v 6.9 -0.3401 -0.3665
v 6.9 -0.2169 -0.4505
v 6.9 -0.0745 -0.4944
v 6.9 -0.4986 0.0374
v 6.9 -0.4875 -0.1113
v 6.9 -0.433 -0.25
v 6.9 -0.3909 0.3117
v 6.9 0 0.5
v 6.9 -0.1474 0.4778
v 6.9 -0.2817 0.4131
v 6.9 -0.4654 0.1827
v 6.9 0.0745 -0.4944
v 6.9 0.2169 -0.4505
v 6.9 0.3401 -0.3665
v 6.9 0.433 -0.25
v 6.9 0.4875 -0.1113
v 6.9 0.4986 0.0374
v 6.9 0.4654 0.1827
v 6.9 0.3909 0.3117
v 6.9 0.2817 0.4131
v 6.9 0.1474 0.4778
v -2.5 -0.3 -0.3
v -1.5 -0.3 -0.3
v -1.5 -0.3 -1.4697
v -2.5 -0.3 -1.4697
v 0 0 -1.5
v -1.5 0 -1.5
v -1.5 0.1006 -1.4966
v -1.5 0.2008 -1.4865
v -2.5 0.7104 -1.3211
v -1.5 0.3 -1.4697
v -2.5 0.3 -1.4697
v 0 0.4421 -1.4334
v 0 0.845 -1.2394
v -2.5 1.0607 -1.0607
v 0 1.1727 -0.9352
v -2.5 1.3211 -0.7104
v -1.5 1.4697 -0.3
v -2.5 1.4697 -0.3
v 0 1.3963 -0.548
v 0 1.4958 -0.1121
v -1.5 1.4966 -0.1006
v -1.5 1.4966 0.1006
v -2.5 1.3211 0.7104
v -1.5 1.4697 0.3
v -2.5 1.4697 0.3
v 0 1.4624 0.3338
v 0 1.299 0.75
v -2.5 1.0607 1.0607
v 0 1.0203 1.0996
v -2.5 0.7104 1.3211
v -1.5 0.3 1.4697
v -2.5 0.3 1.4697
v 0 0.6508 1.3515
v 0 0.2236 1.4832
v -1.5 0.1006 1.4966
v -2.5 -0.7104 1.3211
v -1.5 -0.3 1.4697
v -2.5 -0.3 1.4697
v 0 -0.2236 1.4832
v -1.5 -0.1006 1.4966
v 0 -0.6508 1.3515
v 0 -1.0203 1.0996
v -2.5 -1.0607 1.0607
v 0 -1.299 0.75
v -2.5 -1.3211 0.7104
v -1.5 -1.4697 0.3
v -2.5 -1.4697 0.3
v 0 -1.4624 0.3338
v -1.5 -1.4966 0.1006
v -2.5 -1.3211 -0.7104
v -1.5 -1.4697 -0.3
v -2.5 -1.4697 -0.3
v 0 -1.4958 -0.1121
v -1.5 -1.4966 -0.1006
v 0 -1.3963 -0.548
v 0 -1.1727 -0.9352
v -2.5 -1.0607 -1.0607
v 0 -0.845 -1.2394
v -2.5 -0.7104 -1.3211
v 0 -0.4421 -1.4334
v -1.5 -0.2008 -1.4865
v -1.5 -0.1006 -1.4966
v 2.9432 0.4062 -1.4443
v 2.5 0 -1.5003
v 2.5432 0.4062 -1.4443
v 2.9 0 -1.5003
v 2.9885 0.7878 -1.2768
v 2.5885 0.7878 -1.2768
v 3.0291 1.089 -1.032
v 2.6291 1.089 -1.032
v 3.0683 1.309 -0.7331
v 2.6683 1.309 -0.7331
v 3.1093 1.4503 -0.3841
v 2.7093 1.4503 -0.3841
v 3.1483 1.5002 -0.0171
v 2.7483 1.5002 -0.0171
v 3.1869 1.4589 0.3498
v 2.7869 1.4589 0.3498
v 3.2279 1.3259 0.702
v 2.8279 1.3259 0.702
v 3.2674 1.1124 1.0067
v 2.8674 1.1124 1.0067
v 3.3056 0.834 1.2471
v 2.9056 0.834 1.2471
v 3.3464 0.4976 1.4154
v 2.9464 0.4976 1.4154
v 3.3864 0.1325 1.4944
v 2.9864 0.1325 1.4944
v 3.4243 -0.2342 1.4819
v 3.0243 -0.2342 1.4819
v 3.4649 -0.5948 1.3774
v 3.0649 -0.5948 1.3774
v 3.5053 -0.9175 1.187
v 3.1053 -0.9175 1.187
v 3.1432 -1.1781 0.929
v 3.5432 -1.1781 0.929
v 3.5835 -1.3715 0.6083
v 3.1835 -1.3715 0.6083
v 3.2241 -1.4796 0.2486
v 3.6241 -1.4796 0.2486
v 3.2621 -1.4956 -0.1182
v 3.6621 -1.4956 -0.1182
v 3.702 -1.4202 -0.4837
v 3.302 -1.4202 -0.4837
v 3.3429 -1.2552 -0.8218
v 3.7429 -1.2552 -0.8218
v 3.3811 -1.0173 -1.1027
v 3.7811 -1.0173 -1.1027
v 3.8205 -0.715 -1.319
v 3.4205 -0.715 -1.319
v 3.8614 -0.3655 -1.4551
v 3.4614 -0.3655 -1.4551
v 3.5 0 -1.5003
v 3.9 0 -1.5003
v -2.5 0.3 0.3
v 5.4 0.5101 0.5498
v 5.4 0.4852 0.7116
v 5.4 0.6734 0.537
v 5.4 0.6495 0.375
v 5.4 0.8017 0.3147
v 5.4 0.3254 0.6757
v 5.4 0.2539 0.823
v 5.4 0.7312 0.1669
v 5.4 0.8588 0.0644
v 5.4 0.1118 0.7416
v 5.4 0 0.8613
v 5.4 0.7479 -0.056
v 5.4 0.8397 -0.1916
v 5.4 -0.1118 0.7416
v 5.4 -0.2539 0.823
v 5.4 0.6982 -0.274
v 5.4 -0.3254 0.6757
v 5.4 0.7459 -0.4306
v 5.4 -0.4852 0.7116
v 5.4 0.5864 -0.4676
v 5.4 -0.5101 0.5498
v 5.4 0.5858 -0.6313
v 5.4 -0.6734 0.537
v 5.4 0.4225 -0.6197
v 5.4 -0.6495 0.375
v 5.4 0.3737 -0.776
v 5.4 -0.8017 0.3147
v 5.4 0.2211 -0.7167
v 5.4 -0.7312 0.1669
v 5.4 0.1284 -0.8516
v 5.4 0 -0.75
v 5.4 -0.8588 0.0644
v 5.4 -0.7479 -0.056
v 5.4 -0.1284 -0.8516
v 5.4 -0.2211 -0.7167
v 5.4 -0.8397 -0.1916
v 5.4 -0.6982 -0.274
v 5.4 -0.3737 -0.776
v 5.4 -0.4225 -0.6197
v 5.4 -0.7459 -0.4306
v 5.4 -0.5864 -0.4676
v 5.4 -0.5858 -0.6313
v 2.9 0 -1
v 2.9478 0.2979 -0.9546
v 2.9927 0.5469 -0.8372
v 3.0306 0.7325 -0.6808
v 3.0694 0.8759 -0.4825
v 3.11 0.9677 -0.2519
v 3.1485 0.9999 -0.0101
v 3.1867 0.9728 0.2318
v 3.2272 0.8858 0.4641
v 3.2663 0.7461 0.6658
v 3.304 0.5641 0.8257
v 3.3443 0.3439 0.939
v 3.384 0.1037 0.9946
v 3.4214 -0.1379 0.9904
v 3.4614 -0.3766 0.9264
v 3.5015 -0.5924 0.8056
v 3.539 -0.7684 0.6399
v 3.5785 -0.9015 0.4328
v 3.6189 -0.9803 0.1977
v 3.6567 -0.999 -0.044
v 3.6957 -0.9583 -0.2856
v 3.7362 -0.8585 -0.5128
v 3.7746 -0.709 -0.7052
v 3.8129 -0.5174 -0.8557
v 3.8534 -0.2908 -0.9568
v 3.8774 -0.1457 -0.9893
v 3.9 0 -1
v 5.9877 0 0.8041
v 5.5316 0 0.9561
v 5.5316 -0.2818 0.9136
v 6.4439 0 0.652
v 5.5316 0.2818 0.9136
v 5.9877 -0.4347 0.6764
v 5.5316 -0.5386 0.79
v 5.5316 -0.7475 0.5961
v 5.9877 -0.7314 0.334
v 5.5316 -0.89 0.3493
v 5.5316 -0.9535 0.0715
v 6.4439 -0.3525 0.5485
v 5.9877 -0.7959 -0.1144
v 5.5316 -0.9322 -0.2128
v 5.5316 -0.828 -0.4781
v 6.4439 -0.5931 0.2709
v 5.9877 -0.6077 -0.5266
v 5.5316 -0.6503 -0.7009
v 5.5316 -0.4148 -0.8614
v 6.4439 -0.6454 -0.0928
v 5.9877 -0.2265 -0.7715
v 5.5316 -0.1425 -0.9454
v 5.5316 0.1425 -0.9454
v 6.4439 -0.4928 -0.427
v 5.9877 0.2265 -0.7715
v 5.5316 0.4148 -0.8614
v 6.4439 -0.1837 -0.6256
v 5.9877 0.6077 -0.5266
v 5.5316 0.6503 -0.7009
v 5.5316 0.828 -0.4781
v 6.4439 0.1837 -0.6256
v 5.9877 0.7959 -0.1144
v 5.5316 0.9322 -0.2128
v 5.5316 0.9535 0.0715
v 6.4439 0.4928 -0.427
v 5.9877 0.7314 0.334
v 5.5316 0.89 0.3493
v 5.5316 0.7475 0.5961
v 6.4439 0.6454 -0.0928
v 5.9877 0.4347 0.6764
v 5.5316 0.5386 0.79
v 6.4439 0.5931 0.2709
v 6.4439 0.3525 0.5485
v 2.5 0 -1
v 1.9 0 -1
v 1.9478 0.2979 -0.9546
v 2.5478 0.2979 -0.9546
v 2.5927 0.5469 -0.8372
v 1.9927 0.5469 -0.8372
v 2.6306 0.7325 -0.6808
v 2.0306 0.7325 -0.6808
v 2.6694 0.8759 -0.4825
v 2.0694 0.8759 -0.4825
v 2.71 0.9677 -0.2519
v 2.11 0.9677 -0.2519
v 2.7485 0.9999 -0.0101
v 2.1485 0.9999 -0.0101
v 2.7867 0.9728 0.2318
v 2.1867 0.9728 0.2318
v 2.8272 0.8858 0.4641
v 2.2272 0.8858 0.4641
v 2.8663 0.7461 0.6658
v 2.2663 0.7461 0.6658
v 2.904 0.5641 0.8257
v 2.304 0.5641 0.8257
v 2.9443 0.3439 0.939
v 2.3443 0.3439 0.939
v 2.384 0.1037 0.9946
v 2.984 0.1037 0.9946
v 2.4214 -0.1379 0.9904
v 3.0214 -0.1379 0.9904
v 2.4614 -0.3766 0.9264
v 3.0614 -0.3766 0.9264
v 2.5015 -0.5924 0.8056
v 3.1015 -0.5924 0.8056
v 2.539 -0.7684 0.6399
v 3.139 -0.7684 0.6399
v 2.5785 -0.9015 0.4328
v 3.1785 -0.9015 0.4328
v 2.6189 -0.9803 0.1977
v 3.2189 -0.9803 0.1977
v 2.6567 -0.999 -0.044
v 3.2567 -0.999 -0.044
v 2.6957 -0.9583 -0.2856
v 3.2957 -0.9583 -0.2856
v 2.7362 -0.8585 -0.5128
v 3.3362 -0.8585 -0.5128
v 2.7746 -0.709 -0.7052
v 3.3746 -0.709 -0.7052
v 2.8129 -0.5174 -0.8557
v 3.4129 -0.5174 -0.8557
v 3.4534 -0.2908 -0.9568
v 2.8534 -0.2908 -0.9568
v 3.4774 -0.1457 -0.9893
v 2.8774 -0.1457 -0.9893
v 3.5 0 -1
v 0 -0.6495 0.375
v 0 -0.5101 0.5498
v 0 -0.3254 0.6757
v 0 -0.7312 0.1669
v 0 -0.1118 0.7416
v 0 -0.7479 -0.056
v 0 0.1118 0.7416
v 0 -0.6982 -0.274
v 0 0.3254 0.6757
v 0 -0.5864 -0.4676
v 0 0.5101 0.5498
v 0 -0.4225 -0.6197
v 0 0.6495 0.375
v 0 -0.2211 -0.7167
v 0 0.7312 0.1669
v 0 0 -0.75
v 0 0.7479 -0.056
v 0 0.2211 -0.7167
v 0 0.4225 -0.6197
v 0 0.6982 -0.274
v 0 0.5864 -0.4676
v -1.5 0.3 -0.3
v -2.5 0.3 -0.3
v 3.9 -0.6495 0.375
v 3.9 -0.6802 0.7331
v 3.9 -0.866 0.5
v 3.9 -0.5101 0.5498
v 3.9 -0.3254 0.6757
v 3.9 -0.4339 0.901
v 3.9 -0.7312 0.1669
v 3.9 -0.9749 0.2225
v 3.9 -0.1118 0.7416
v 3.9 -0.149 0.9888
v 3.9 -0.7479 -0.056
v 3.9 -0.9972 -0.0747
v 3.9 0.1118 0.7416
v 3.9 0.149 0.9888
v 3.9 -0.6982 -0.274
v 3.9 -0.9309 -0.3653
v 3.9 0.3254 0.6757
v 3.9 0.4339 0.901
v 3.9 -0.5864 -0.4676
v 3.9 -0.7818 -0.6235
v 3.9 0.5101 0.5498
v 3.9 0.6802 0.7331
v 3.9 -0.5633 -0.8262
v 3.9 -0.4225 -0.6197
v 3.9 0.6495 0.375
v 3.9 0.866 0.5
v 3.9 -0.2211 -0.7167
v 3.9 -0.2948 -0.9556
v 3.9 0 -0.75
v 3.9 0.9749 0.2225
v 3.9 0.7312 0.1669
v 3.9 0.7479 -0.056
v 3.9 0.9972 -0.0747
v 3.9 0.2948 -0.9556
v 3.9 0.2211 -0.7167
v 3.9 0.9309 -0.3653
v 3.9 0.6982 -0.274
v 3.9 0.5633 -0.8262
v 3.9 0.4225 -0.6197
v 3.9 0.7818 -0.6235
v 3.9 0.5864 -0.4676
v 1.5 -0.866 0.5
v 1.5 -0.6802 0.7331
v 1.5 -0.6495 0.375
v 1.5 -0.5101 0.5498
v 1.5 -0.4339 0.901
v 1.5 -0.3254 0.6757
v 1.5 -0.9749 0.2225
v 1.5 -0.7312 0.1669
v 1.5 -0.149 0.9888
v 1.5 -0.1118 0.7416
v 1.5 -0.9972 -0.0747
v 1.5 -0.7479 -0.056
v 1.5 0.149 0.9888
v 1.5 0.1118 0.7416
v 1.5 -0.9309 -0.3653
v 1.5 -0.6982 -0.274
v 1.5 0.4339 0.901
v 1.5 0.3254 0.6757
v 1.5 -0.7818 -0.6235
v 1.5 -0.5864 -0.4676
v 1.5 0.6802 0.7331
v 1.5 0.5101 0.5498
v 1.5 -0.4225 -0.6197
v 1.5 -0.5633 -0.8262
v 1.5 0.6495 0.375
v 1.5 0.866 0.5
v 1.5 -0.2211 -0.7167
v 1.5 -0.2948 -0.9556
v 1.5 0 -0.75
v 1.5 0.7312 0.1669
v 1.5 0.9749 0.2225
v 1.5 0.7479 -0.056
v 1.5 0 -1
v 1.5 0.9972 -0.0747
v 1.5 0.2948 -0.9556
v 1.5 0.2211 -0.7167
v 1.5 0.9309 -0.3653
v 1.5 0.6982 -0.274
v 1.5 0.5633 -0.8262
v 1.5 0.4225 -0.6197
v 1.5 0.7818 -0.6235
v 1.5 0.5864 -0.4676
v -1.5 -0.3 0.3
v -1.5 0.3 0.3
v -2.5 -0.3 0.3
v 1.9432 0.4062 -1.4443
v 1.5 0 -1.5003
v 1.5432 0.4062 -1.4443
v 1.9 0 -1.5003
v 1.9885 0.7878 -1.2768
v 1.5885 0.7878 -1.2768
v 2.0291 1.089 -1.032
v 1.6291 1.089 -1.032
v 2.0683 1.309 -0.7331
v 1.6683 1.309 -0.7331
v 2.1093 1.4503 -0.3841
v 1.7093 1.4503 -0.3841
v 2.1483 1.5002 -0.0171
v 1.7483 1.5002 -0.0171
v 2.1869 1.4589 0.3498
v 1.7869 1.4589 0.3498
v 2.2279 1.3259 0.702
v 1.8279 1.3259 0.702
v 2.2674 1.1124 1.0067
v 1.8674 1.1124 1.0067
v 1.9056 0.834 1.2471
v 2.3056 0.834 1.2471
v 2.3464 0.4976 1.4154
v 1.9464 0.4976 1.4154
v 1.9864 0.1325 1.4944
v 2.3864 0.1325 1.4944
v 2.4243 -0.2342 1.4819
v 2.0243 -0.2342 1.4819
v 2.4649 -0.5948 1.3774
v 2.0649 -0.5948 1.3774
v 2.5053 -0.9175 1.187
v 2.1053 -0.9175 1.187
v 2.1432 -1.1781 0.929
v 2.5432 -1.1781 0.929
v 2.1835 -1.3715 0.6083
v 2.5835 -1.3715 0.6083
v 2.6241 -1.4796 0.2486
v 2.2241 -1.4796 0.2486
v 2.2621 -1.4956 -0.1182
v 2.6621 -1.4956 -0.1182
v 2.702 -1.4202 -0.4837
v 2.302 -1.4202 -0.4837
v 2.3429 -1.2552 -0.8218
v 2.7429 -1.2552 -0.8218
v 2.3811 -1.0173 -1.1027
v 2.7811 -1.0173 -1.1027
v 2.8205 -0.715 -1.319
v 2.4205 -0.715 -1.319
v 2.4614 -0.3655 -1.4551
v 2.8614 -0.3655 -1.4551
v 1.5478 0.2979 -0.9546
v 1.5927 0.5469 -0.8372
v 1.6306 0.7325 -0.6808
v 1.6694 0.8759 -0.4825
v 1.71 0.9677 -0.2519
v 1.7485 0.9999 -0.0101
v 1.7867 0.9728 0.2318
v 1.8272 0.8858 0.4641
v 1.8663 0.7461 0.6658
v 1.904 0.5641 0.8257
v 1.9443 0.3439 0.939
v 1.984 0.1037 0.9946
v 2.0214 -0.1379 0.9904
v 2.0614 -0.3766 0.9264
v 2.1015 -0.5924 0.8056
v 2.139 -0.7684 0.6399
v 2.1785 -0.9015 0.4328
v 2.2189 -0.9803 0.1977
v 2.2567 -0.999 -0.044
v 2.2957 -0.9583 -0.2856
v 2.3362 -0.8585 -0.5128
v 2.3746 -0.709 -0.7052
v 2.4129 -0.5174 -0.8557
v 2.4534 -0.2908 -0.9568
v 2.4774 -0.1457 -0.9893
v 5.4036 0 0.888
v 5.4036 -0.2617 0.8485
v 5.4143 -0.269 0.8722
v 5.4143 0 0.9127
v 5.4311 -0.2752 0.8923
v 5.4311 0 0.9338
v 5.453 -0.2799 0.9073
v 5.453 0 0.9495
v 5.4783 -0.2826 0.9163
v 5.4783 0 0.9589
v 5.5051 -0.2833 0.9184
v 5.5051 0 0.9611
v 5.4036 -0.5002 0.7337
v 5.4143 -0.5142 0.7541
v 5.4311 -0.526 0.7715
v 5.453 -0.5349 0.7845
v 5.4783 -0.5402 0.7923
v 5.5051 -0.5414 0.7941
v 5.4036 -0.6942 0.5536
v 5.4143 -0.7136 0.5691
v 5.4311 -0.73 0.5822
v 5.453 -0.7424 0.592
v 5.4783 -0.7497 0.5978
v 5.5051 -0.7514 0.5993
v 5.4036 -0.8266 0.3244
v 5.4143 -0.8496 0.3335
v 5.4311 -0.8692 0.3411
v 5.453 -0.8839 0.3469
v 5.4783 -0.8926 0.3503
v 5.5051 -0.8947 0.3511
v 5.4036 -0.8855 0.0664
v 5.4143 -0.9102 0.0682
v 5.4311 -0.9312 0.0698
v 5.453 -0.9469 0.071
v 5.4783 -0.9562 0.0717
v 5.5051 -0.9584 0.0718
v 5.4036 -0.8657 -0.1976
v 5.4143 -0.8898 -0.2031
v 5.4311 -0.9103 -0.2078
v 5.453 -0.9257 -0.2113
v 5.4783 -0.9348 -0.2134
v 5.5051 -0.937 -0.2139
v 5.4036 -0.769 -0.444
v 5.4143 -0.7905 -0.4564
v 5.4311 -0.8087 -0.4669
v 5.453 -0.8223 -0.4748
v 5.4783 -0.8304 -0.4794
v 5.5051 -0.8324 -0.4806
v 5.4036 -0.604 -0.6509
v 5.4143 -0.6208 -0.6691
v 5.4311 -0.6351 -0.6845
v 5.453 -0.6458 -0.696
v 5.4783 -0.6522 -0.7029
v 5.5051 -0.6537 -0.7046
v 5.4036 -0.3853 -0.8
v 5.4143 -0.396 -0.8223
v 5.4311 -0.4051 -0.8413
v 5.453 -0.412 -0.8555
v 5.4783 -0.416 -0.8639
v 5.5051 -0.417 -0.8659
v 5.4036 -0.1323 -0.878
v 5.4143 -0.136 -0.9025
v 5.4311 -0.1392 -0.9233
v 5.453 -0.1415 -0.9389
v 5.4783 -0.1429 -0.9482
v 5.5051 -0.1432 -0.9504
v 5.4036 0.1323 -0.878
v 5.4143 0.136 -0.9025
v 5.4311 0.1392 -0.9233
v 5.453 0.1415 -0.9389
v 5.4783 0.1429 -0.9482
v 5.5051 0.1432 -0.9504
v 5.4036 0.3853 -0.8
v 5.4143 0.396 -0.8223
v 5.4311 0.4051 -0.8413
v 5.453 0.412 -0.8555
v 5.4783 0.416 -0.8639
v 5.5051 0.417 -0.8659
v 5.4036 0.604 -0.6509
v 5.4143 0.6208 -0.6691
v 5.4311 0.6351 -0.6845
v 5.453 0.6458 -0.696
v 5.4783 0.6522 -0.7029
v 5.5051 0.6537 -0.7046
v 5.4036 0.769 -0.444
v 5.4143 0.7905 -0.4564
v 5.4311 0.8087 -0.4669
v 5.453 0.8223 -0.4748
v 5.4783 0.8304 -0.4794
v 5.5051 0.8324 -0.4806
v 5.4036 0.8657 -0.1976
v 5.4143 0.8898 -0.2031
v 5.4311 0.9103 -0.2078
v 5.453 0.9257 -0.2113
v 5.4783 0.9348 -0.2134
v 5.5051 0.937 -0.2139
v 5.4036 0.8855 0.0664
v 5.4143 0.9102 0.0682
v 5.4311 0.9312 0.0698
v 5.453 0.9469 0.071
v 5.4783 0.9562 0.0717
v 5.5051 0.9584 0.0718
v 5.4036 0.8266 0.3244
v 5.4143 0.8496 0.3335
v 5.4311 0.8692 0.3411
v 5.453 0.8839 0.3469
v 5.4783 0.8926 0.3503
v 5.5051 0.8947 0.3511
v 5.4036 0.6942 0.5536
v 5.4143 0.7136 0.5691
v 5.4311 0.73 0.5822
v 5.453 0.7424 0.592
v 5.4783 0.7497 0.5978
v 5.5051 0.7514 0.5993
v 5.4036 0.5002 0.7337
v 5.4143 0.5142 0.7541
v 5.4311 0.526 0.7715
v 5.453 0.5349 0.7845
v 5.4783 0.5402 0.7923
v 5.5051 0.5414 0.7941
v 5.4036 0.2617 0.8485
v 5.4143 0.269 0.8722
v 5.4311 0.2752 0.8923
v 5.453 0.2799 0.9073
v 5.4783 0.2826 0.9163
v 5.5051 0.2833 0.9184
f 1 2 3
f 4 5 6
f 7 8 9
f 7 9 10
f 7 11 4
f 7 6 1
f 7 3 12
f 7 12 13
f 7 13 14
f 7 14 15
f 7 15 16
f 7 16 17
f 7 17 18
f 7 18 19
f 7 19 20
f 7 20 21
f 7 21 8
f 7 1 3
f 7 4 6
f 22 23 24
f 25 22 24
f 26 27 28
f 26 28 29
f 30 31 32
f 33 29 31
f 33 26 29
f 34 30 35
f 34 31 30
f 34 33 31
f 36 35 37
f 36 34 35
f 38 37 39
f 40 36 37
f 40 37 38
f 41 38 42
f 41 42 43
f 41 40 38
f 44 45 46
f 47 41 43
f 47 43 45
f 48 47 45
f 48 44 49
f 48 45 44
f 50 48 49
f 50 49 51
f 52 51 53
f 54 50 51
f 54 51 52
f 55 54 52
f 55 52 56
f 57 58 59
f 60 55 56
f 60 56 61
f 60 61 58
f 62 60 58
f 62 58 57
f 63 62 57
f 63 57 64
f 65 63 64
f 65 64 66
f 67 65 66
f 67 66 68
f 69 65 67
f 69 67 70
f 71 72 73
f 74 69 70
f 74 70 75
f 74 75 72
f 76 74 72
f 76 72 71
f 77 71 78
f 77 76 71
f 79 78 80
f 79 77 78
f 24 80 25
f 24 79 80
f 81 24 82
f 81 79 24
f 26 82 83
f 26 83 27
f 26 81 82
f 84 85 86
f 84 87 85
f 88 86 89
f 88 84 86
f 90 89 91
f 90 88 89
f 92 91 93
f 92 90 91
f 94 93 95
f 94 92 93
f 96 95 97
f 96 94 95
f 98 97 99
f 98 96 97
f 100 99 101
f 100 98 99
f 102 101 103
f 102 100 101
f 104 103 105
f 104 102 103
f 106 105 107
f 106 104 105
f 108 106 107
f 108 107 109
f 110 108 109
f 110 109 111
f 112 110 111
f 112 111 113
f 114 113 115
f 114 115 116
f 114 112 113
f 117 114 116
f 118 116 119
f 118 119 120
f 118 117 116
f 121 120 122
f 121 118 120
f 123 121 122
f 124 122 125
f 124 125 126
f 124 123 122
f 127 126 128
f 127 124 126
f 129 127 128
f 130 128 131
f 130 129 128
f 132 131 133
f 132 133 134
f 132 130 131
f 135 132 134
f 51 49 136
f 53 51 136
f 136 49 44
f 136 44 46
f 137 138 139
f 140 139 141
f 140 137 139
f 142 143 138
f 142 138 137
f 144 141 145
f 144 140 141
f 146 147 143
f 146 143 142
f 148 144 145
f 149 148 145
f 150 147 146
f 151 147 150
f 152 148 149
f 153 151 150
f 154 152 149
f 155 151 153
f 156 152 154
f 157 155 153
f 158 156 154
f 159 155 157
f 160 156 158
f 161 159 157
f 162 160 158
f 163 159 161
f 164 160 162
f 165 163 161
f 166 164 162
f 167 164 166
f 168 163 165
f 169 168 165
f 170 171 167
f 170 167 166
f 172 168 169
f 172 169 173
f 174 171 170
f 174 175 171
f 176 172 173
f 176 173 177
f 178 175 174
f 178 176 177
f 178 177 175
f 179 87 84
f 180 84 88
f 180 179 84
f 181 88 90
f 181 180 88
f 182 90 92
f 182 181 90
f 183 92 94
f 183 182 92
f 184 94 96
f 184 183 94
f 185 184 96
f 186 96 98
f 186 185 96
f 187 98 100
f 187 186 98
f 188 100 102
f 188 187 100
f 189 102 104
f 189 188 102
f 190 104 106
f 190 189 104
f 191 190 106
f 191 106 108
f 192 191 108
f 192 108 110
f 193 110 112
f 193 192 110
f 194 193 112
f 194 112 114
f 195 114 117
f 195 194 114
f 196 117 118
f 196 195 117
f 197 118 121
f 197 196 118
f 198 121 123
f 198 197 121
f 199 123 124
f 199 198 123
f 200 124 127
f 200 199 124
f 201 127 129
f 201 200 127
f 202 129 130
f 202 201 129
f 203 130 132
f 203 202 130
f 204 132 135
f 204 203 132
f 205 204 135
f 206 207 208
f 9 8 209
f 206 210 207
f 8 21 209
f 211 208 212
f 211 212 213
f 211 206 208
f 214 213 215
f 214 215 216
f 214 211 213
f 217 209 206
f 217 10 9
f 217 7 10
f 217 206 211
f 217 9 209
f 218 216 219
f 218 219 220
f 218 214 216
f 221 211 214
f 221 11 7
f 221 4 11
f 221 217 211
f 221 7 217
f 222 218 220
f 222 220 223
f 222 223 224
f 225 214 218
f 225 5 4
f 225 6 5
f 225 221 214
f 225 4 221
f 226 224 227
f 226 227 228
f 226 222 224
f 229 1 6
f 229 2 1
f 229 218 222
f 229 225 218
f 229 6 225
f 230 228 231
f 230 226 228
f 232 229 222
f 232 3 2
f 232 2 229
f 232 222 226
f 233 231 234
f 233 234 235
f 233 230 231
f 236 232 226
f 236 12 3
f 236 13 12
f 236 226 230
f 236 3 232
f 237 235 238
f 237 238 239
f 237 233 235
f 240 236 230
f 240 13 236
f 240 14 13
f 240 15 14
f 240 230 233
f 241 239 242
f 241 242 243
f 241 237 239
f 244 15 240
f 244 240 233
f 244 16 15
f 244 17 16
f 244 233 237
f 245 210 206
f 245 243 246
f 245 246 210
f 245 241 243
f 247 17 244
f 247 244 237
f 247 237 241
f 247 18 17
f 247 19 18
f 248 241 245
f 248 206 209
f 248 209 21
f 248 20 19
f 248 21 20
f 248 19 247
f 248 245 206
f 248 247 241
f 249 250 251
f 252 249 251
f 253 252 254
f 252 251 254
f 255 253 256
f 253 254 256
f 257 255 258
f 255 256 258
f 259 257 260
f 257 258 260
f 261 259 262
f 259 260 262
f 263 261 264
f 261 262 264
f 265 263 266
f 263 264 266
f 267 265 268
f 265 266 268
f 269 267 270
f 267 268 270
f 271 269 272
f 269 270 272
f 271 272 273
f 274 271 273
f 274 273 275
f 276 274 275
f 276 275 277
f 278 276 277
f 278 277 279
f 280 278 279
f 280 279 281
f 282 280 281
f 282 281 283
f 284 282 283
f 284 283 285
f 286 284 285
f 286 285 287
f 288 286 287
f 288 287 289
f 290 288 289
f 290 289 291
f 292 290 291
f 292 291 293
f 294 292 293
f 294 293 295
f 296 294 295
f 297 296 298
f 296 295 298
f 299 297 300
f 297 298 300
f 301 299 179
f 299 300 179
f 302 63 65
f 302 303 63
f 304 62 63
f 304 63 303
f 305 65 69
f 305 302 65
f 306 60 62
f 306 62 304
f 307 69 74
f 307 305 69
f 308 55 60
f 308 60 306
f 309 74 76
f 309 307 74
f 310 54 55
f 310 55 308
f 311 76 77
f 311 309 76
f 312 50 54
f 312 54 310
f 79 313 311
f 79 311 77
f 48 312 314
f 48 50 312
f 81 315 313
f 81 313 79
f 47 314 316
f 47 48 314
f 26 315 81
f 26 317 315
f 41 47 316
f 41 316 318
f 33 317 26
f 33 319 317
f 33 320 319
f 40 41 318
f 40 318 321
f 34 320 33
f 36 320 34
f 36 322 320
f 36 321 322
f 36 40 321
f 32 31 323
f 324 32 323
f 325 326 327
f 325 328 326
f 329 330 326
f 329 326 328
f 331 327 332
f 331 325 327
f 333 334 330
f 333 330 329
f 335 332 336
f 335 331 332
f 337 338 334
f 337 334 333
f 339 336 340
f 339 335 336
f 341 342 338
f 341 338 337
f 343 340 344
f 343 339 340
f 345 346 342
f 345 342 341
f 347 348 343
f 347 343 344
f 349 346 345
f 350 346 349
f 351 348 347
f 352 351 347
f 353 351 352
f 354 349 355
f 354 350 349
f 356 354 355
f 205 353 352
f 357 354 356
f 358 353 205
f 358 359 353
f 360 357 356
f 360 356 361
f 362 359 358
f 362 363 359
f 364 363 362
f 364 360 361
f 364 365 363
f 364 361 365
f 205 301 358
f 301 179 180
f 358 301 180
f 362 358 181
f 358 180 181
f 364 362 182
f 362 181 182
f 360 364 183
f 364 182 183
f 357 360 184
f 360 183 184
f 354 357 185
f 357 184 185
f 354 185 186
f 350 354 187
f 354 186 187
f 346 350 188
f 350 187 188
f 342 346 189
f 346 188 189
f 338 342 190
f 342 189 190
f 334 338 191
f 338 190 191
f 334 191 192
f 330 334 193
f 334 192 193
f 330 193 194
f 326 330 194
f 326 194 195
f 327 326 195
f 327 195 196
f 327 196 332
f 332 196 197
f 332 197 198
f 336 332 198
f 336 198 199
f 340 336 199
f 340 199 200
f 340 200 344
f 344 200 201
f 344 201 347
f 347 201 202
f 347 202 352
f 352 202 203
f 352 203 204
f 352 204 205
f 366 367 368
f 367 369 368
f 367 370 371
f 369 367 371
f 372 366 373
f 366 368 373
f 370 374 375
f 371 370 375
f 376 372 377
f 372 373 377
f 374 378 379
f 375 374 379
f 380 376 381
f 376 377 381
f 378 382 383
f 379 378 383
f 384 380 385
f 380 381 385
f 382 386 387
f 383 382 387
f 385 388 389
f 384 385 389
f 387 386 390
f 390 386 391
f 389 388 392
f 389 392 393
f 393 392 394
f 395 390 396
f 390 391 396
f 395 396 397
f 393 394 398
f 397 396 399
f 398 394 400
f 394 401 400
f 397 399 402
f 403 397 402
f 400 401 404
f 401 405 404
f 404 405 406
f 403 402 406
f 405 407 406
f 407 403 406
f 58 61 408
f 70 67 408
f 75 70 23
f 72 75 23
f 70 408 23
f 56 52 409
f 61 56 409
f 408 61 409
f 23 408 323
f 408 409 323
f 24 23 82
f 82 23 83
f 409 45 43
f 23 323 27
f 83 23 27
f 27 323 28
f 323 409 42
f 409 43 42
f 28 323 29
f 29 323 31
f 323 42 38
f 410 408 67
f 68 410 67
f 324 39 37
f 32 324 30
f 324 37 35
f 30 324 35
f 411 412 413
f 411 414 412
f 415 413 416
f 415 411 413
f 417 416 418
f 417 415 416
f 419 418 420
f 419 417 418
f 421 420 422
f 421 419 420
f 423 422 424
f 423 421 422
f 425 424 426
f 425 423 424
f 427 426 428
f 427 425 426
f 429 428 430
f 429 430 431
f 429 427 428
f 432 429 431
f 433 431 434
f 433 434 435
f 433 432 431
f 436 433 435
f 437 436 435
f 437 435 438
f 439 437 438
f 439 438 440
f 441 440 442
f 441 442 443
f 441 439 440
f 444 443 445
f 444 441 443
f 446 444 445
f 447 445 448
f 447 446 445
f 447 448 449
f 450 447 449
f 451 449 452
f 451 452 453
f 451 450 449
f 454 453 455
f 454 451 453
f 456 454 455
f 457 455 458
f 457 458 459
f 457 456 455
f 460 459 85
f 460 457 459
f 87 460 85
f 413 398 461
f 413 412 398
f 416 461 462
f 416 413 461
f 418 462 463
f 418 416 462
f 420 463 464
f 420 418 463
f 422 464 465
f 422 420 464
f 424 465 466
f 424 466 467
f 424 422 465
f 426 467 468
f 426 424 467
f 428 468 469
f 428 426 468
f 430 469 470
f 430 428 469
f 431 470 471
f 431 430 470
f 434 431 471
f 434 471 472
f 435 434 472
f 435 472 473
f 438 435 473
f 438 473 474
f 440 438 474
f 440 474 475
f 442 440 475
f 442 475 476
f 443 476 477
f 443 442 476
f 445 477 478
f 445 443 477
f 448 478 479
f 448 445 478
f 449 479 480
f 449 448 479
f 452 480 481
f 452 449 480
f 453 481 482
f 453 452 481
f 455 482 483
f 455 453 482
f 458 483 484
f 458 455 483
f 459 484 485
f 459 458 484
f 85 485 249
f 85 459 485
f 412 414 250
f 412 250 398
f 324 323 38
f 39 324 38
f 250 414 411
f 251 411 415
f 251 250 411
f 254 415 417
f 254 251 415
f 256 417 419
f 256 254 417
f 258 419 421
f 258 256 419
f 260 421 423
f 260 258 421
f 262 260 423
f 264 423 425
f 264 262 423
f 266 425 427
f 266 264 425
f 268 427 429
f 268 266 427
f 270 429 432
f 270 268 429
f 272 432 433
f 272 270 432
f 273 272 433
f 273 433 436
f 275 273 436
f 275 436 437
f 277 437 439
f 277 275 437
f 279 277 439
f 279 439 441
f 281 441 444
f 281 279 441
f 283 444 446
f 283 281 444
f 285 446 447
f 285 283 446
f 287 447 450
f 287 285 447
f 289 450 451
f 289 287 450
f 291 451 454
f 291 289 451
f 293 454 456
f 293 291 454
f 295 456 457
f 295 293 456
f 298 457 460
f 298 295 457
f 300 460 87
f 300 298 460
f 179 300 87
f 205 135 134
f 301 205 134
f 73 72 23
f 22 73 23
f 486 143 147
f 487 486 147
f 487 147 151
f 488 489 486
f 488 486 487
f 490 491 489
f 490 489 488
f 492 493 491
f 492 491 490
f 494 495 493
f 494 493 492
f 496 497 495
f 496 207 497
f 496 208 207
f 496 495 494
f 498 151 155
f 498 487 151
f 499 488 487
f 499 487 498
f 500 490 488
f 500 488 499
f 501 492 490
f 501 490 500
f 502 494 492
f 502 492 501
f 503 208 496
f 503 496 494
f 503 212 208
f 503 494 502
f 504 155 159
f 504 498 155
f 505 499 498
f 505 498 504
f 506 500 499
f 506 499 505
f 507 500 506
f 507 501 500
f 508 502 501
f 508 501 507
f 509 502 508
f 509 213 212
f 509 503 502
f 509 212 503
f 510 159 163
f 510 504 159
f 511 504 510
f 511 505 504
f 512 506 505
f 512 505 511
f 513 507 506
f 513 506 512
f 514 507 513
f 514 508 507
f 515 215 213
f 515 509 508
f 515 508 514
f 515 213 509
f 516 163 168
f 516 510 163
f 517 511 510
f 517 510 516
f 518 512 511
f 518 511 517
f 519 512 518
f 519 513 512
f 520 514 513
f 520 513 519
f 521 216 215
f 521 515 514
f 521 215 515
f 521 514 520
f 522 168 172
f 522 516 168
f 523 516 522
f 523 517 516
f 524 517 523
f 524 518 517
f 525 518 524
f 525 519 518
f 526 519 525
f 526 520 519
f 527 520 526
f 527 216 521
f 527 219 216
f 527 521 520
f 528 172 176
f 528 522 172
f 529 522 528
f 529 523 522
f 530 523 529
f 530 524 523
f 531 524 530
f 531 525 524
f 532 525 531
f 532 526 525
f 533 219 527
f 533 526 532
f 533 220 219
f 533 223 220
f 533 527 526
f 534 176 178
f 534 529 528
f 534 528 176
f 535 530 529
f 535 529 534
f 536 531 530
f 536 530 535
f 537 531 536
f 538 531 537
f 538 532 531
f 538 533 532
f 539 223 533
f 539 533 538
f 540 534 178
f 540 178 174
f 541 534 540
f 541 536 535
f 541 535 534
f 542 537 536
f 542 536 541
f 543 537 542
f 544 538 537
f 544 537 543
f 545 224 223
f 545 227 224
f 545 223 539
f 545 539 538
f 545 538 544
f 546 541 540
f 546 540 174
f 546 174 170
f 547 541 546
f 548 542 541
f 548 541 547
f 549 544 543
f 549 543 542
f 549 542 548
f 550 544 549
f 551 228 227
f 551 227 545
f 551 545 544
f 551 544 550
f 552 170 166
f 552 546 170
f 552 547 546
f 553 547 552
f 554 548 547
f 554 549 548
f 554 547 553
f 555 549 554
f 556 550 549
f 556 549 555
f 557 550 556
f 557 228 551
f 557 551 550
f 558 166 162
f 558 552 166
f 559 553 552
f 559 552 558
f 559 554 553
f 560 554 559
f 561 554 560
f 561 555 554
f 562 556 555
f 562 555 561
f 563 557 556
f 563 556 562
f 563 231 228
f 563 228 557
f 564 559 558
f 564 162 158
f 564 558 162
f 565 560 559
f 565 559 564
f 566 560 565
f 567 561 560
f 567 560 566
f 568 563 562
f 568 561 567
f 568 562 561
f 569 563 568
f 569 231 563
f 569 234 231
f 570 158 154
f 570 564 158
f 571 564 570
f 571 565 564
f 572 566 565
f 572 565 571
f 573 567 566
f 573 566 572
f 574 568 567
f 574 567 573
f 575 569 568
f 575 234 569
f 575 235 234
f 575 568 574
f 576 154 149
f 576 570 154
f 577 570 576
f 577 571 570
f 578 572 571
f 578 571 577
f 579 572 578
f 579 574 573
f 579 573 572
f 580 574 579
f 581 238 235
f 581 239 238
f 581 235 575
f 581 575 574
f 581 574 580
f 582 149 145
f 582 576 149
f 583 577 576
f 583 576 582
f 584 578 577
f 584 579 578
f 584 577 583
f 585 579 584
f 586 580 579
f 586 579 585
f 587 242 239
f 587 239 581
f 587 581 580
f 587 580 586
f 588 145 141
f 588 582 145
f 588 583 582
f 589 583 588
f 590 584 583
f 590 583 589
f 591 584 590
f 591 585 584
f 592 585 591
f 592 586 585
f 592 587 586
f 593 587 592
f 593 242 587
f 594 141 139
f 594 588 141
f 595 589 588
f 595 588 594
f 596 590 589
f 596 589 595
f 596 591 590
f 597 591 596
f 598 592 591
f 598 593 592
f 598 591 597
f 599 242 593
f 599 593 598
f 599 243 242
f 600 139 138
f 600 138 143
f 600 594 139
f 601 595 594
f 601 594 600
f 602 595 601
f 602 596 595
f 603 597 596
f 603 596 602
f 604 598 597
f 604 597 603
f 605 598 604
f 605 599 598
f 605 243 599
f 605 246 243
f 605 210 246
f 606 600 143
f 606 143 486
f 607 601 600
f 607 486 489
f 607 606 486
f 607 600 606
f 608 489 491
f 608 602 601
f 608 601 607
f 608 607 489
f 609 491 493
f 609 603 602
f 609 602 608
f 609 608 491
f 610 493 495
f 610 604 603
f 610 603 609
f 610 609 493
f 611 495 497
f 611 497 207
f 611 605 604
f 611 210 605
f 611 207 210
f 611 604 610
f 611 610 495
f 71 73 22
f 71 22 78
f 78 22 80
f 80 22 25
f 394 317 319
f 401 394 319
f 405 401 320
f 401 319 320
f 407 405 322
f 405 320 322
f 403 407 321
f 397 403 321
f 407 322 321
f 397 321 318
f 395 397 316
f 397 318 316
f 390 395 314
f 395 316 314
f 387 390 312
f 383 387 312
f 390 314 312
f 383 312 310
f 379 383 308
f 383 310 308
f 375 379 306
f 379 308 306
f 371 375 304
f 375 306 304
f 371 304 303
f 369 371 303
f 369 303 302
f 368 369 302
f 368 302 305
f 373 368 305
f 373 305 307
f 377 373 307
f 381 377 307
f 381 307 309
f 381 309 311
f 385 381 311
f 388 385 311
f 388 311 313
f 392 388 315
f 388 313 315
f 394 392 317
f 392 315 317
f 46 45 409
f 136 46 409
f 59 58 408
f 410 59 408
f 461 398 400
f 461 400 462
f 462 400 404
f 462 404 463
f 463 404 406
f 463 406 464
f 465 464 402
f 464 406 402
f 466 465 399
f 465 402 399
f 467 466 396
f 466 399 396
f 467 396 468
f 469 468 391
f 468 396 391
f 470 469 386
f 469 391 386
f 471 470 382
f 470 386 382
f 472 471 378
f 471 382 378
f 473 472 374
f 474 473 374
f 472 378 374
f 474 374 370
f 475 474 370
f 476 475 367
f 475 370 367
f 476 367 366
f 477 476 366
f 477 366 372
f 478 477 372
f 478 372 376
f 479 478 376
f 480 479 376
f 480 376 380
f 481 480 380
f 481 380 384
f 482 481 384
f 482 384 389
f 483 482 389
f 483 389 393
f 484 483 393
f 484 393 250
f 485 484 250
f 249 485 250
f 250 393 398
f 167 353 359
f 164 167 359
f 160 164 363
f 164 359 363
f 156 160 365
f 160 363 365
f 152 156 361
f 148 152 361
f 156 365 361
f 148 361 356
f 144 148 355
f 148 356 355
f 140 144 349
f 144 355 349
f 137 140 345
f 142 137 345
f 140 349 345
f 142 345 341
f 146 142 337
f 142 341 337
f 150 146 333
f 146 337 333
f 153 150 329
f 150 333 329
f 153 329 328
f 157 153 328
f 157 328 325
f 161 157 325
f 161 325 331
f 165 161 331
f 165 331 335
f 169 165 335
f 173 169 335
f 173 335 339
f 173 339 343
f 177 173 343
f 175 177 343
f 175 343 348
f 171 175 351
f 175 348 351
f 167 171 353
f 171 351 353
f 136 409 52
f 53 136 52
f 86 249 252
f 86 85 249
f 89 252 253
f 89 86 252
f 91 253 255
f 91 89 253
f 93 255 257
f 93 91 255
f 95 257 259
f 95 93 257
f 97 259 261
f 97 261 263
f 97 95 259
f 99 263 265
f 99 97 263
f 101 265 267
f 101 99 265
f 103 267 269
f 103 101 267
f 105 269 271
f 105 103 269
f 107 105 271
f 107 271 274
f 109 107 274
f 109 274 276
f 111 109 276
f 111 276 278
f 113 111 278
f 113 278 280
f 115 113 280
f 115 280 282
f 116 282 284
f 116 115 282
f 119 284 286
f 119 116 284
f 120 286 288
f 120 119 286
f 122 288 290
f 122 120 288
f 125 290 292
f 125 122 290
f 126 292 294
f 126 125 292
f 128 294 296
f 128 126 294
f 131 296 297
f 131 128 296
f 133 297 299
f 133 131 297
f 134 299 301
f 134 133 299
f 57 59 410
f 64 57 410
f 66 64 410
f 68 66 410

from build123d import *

# Parameters (mm, degrees)
SKETCH1_R           = 0.75
BOSS_EXTRUDE4_DEPTH = 1.5
SKETCH1_6_R         = 1.5
BOSS_EXTRUDE5_DEPTH = 2.5
BOSS_EXTRUDE6_START = 1.5
SKETCH1_7_R         = 1
BOSS_EXTRUDE6_DEPTH = 2.4
SWEEP2_PITCH        = 1
BOSS_EXTRUDE7_START = 3.9
SKETCH1_8_R         = 0.75
BOSS_EXTRUDE7_DEPTH = 1.5
CUT_EXTRUDE2_START  = -1
CUT_EXTRUDE2_DEPTH  = 1
FILLET2_R           = 0.1


with BuildPart() as part:
    # Sketch1 → Boss-Extrude4 (new body)
    with BuildSketch(Plane(origin=(0, 0, 0), x_dir=(0, 0, -1), z_dir=(1, 0, 0))):
        Circle(SKETCH1_R)
    extrude(amount=BOSS_EXTRUDE4_DEPTH)

    # Sketch1<6> → Boss-Extrude5 (add)
    with BuildSketch(Plane(origin=(0, 0, 0), x_dir=(0, 0, -1), z_dir=(1, 0, 0))):
        Circle(SKETCH1_6_R)
    extrude(amount=-BOSS_EXTRUDE5_DEPTH)

    # Sketch1<7> → Boss-Extrude6 (add)
    with BuildSketch(Plane(origin=(0, 0, 0), x_dir=(0, 0, -1), z_dir=(1, 0, 0)).offset(BOSS_EXTRUDE6_START)):
        Circle(SKETCH1_7_R)
    extrude(amount=BOSS_EXTRUDE6_DEPTH)

    # Sweep2: the profile of Sketch7 profile screwed along a right-hand helix of 2 turns, 8 arcs to a turn; built about Z, then put on its axis
    sweep2_z = Axis((0, 0, 0), (0, 0, 1))
    sweep2_corners = [(1.5003, 0, -0.25), (1.5003, 0, 0.15), (1, 0, 0.15), (1, 0, -0.25)]
    with BuildLine(mode=Mode.PRIVATE) as sweep2_profile:
        Line(sweep2_corners[0], sweep2_corners[1])
        Line(sweep2_corners[1], sweep2_corners[2])
        Line(sweep2_corners[2], sweep2_corners[3])
        Line(sweep2_corners[3], sweep2_corners[0])
    sweep2_cap = Face(sweep2_profile.wire())
    sweep2_turn_angles = [0, 22.5, 45, 67.5, 90, 112.5, 135, 157.5, 180, 202.5, 225, 247.5, 270, 292.5, 315, 337.5, 360]
    sweep2_turn_weights = [1, 0.9238795325112867, 1, 0.9238795325112867, 1, 0.9238795325112867, 1, 0.9238795325112867, 1, 0.9238795325112867, 1, 0.9238795325112867, 1, 0.9238795325112867, 1, 0.9238795325112867, 1]
    sweep2_turn_rails = [Edge.make_bspline([Vector(p[0], p[1], 0).rotate(sweep2_z, sweep2_turn_angles[k]) / sweep2_turn_weights[k] + Vector(0, 0, p[2] + SWEEP2_PITCH * sweep2_turn_angles[k] / 360) for k in range(17)], [0, 0, 0, 1, 1, 2, 2, 3, 3, 4, 4, 5, 5, 6, 6, 7, 7, 8, 8, 8], 2, sweep2_turn_weights) for p in sweep2_corners]
    sweep2_turn_sides = [Face.make_surface_from_curves(sweep2_turn_rails[p[0]], sweep2_turn_rails[p[1]]) for p in [(0, 1), (1, 2), (2, 3), (3, 0)]]
    sweep2 = Plane(origin=(1.75, 0, 0), x_dir=(0, 0, -1), z_dir=(1, 0, 0)) * Solid(Shell([*[p.moved(Location((0, 0, SWEEP2_PITCH * i))) for i in range(2) for p in sweep2_turn_sides], sweep2_cap, sweep2_cap.rotate(sweep2_z, 720).moved(Location((0, 0, SWEEP2_PITCH * 720 / 360)))]))
    add(sweep2)

    # Sketch1<8> → Boss-Extrude7 (add)
    with BuildSketch(Plane(origin=(0, 0, 0), x_dir=(0, 0, -1), z_dir=(1, 0, 0)).offset(BOSS_EXTRUDE7_START)):
        Circle(SKETCH1_8_R)
    extrude(amount=BOSS_EXTRUDE7_DEPTH)

    # Sketch8 → Cut-Extrude2 (cut)
    with BuildSketch(Plane.ZY.offset(2.5).offset(CUT_EXTRUDE2_START)):
        with BuildLine():
            Line((0.3, 1.469693846), (0.3, 0.3))
            Line((0.3, 0.3), (1.469693846, 0.3))
            ThreePointArc((1.469693846, 0.3), (1.5, 0), (1.469693846, -0.3))
            Line((1.469693846, -0.3), (0.3, -0.3))
            Line((0.3, -0.3), (0.3, -1.469693846))
            ThreePointArc((0.3, -1.469693846), (0, -1.5), (-0.3, -1.469693846))
            Line((-0.3, -1.469693846), (-0.3, -0.3))
            Line((-0.3, -0.3), (-1.469693846, -0.3))
            ThreePointArc((-1.469693846, -0.3), (-1.5, 0), (-1.469693846, 0.3))
            Line((-1.469693846, 0.3), (-0.3, 0.3))
            Line((-0.3, 0.3), (-0.3, 1.469693846))
            ThreePointArc((-0.3, 1.469693846), (0, 1.5), (0.3, 1.469693846))
        make_face()
    extrude(amount=CUT_EXTRUDE2_DEPTH, mode=Mode.SUBTRACT)

    # Sketch9 → Revolve2 (revolve)
    with BuildSketch(Plane(origin=(0, 0, 0), x_dir=(1, 0, 0), z_dir=(0, 1, 0)), mode=Mode.PRIVATE) as revolve2_sk:
        Polygon((5.4, 0), (5.4, 1), (6.9, 0.5), (6.9, 0), align=None)
    revolve(revolve2_sk.sketch.rotate(Axis((0, 0, 0), (1, 0, 0)), 180), axis=Axis((0, 0, 0), (1, 0, 0)))

    # Fillet2
    fillet2_edges = [part.edges().sort_by_distance(p)[0] for p in [
        (5.4, 0, -1),
    ]]
    fillet(fillet2_edges, radius=FILLET2_R)


solid = part.part
